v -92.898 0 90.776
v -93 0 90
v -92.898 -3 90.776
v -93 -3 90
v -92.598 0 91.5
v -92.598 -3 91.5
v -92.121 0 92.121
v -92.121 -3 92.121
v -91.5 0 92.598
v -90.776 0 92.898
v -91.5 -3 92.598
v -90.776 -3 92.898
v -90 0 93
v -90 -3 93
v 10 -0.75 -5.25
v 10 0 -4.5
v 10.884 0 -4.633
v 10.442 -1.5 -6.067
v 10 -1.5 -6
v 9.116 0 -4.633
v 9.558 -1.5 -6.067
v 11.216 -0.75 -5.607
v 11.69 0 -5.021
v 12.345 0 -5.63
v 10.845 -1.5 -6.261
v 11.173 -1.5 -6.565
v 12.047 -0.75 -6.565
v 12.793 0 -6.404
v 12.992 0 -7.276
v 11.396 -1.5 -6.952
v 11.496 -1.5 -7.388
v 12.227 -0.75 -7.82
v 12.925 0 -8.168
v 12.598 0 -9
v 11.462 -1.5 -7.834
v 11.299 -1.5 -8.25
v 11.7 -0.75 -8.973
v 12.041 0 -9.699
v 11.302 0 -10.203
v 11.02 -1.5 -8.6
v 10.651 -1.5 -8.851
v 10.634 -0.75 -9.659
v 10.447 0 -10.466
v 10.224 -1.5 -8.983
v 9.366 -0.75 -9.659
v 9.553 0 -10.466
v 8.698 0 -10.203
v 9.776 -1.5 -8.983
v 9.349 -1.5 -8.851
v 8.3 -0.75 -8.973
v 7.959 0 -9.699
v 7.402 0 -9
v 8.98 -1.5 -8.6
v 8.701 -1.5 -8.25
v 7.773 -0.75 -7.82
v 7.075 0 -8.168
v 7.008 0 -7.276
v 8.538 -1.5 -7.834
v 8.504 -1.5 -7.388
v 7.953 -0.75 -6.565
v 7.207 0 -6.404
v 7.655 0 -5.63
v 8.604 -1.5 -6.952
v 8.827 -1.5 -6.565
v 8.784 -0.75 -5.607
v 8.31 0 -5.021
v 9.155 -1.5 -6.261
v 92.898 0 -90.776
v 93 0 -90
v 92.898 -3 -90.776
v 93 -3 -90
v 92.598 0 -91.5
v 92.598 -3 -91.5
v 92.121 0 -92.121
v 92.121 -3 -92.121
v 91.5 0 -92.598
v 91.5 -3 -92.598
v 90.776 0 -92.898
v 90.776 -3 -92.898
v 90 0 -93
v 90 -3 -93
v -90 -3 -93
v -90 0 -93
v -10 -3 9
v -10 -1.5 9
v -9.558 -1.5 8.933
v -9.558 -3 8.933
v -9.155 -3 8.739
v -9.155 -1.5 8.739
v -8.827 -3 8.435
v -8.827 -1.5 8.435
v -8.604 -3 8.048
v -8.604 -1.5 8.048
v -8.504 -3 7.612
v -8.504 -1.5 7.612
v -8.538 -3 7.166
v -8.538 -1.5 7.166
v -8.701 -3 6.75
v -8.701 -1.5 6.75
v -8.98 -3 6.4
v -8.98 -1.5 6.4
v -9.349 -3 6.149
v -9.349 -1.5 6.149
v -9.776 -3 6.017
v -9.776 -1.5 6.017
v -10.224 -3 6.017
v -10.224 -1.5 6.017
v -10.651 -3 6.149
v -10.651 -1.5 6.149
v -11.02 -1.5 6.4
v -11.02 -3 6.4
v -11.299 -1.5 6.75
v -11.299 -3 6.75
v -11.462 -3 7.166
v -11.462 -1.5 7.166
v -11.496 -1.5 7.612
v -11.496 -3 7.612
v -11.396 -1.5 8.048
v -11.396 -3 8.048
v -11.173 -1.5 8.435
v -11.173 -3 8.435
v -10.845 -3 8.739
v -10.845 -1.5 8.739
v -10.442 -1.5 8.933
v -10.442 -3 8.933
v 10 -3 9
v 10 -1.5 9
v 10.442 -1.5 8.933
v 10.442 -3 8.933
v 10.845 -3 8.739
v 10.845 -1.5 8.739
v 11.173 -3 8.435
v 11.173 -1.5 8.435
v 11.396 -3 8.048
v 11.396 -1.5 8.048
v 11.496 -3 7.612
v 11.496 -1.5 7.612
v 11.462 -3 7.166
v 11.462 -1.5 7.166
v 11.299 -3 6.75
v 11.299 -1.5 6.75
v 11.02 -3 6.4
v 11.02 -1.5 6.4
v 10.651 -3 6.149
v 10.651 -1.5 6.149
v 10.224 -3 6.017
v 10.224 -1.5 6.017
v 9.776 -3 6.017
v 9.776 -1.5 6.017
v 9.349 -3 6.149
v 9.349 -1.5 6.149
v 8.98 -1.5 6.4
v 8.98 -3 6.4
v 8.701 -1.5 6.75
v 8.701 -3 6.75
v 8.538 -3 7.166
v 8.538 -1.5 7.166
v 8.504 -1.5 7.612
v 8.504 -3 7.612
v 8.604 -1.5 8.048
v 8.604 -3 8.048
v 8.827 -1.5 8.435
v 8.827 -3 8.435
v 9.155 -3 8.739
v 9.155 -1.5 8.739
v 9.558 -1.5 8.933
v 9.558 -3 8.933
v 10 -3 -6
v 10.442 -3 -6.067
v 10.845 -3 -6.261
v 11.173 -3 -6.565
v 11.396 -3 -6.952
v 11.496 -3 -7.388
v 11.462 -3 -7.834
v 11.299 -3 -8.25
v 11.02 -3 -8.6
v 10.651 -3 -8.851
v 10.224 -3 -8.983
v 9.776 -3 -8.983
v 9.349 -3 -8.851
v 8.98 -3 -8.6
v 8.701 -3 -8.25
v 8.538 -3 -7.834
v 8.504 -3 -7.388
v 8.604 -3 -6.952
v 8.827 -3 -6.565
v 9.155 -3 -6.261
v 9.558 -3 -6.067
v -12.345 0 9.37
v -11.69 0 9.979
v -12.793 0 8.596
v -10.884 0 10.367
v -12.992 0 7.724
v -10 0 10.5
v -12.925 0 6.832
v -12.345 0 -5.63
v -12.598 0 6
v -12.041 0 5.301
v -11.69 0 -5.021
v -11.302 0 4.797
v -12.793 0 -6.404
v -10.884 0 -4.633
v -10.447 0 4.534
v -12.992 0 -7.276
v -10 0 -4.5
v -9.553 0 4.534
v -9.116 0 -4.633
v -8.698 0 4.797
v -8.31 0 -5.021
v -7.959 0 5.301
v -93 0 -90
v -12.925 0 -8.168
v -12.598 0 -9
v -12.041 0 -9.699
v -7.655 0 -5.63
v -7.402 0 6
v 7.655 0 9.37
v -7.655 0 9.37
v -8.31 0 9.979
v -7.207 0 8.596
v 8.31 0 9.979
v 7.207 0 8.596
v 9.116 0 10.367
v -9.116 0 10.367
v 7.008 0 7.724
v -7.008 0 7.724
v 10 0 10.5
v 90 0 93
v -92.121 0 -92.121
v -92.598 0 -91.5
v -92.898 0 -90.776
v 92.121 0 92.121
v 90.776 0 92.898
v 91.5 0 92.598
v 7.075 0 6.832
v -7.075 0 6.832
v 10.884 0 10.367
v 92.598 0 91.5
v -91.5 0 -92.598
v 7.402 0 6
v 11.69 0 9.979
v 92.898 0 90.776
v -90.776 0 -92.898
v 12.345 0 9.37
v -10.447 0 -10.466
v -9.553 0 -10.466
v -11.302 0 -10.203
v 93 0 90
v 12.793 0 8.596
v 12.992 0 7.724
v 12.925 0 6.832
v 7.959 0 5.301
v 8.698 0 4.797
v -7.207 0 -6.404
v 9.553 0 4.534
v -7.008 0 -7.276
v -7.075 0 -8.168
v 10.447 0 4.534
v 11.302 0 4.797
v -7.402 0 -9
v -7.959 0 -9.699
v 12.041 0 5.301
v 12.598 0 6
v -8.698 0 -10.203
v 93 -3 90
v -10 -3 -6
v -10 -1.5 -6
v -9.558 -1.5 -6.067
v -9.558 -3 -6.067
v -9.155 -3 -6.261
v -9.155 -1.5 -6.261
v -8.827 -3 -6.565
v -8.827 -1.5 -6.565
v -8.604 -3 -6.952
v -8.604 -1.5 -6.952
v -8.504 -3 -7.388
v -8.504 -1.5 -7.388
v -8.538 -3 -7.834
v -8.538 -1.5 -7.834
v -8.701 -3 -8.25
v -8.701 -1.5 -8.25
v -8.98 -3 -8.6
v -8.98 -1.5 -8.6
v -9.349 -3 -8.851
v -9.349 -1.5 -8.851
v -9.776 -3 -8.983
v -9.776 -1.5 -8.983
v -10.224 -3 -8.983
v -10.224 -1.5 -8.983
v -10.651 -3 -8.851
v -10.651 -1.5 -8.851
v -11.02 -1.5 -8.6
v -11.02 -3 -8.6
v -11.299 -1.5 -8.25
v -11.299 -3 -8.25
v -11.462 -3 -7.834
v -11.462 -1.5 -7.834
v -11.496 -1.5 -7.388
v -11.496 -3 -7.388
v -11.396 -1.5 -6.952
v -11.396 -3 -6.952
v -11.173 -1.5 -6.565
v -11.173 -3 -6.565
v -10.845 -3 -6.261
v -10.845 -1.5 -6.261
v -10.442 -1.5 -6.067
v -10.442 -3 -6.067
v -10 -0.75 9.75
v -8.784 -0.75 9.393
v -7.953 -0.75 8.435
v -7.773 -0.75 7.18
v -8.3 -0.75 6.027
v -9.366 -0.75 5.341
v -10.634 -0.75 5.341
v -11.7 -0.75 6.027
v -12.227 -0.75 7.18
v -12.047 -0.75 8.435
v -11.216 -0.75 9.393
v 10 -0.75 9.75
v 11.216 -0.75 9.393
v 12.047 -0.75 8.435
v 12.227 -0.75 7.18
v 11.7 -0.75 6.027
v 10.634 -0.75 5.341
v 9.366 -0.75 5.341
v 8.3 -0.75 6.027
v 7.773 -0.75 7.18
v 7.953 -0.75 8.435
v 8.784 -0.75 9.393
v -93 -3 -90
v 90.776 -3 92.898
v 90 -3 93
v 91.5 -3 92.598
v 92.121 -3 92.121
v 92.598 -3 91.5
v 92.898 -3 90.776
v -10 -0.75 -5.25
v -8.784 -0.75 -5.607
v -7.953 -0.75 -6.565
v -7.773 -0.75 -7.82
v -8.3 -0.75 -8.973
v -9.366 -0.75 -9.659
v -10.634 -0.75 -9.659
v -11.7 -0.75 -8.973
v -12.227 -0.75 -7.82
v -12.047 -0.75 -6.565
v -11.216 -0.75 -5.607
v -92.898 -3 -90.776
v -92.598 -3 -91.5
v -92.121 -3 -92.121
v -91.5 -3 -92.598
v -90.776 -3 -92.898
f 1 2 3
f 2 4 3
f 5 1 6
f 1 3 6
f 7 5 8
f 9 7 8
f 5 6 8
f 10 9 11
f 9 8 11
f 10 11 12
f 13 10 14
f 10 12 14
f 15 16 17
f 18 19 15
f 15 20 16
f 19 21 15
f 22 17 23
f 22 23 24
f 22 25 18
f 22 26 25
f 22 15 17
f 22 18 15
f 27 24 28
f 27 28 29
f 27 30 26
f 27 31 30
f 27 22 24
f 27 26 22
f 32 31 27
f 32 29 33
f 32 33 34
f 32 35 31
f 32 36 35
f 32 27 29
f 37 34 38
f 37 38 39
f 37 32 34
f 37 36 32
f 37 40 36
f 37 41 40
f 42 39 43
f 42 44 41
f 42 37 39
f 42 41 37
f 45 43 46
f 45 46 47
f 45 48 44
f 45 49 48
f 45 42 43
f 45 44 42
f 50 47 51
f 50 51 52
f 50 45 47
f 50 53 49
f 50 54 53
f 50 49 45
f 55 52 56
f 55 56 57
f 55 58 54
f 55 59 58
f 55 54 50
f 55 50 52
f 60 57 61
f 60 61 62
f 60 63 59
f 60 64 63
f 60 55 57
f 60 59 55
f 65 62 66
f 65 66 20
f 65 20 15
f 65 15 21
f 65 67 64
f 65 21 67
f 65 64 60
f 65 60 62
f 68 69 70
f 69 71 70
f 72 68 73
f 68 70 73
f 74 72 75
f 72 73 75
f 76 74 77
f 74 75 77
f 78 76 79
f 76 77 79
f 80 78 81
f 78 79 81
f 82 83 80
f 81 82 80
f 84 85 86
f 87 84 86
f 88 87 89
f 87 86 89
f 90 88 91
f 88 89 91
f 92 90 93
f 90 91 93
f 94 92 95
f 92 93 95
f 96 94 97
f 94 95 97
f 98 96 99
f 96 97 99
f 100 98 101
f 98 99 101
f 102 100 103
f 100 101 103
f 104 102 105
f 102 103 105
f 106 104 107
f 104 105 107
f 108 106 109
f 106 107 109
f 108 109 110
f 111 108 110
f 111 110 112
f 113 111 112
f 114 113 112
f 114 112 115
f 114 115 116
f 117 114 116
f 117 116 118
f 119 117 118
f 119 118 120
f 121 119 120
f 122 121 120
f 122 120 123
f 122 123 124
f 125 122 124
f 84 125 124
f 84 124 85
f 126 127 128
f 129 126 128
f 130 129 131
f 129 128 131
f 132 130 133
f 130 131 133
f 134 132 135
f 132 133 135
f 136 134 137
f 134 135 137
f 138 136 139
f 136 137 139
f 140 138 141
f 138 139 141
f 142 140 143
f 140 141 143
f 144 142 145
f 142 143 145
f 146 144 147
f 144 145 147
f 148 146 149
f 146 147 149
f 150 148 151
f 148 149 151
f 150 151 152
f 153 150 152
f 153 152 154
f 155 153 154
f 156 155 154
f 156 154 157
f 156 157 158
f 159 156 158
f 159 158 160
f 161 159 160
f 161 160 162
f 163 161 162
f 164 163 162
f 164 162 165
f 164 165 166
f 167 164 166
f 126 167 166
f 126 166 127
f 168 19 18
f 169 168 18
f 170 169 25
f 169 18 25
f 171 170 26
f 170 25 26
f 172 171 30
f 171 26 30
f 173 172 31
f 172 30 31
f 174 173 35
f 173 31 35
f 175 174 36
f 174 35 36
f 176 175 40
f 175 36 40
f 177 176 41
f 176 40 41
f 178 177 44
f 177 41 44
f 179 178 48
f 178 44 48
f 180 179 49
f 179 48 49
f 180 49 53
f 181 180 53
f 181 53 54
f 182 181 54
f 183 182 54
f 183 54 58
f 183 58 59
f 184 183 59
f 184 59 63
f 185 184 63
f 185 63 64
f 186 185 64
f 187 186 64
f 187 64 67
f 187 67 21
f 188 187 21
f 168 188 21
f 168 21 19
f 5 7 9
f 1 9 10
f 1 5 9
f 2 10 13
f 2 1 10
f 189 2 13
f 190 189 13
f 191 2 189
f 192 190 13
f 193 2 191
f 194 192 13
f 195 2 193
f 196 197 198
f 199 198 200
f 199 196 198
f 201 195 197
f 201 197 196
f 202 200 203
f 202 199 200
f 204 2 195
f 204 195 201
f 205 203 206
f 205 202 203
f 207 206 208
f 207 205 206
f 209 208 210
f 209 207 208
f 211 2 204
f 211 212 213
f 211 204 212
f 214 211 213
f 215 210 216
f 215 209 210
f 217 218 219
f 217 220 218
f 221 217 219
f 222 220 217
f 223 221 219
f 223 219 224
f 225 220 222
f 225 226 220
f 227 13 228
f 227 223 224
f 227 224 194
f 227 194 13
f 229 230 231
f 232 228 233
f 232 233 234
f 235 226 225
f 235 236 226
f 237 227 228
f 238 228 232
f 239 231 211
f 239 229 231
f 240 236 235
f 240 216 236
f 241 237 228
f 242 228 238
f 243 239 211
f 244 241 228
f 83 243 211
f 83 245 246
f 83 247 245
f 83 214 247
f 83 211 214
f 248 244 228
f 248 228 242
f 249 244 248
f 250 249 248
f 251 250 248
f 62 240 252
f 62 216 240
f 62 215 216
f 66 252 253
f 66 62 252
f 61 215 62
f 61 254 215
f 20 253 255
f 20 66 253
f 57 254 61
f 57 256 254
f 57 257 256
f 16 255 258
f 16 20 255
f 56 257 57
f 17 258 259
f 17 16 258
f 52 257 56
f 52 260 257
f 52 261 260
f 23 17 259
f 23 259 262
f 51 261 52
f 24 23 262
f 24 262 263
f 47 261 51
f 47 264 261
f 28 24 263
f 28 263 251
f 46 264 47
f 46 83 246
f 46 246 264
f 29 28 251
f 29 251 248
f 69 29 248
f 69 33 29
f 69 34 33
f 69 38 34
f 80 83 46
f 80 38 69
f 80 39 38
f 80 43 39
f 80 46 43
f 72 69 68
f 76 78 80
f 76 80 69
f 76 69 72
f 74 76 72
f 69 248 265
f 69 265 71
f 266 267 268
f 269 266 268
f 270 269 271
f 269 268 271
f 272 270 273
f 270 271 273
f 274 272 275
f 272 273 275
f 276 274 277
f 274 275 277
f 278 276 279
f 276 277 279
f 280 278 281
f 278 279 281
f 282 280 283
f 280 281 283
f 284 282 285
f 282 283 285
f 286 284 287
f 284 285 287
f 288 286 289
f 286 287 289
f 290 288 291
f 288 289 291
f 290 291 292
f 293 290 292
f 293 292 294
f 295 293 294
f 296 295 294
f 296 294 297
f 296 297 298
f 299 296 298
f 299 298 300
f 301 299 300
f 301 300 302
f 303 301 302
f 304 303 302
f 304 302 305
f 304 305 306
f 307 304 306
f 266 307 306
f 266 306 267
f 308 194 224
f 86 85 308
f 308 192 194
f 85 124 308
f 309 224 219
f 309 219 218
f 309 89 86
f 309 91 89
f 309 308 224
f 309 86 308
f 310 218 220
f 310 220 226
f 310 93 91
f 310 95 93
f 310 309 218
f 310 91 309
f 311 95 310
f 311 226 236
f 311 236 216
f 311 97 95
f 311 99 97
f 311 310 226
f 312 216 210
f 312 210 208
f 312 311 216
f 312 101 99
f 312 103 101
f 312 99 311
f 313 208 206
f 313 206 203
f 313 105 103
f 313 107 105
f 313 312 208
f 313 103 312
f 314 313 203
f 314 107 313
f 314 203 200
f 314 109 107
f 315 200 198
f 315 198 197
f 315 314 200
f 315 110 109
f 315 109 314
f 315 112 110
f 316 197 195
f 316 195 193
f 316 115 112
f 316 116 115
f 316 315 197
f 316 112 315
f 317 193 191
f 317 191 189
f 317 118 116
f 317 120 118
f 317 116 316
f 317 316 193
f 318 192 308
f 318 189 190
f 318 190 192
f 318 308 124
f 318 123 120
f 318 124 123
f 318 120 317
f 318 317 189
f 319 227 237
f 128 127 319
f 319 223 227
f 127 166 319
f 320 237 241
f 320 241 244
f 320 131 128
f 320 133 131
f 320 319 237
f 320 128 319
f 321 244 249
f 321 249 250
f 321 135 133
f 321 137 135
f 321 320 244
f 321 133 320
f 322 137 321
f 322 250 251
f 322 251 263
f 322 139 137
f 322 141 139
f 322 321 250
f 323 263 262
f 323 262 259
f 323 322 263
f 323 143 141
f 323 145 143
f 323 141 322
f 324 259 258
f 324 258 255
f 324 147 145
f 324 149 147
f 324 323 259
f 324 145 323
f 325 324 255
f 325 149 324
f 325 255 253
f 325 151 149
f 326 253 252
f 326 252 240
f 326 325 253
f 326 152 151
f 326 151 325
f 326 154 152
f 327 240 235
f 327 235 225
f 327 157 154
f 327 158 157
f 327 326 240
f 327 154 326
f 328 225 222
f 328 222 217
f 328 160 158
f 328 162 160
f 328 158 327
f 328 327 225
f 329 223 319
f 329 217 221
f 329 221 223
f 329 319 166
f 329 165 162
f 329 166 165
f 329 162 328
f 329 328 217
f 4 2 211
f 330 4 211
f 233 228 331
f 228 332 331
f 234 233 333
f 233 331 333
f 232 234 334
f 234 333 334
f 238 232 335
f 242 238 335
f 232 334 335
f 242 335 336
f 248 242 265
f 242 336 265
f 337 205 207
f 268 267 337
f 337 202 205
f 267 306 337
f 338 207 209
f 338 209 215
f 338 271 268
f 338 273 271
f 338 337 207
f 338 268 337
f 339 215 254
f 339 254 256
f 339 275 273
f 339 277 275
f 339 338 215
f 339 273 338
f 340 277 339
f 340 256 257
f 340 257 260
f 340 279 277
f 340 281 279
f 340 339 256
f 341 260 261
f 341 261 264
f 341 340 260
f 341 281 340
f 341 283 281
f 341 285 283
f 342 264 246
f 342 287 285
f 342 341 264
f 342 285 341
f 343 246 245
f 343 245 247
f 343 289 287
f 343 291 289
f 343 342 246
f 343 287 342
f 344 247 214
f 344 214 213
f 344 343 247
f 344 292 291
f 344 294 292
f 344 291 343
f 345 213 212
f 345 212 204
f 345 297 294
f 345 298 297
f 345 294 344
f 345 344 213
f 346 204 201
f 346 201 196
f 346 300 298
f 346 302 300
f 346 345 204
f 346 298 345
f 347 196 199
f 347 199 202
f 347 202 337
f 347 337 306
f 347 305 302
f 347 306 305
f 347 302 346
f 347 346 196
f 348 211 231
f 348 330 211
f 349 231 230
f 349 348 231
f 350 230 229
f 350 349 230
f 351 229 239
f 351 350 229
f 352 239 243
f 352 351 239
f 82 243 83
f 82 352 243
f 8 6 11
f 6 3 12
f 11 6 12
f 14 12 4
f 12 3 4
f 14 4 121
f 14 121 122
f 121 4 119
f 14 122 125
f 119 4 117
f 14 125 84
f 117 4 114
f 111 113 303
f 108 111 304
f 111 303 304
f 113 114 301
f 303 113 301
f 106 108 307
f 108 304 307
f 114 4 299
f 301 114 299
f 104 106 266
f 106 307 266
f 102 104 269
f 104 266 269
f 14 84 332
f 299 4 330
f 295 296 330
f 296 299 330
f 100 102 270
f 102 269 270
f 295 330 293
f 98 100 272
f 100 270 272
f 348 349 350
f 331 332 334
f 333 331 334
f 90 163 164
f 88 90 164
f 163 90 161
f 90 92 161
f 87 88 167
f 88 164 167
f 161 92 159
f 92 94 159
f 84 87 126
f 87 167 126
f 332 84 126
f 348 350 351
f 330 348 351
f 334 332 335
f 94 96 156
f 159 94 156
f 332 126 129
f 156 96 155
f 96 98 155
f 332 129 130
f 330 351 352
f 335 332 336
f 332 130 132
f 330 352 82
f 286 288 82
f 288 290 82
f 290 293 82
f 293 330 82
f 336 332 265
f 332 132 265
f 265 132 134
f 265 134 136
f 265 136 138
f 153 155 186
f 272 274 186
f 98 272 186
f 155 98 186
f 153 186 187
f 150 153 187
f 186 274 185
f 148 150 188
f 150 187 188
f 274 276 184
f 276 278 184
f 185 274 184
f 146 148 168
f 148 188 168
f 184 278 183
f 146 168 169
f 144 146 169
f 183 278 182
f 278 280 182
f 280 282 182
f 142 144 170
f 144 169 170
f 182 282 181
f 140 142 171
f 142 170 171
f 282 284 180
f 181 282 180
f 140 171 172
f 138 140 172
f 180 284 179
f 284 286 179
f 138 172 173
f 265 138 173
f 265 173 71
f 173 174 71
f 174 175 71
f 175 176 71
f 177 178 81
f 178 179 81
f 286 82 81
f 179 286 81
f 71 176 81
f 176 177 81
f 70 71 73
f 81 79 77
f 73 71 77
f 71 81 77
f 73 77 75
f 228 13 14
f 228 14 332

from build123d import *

# Parameters (mm, degrees)
SKETCH1_W           = 186
SKETCH1_H           = 186
BOSS_EXTRUDE1_DEPTH = 3
FILLET1_R           = 3
SKETCH2_R           = 1.5
CUT_EXTRUDE1_DEPTH  = 10
CHAMFER1_SIZE       = 1.5


with BuildPart() as part:
    # Sketch1 → Boss-Extrude1 (new body)
    with BuildSketch(Plane(origin=(0, 0, 0), x_dir=(1, 0, 0), z_dir=(0, 1, 0))):
        Rectangle(SKETCH1_W, SKETCH1_H)
    extrude(amount=-BOSS_EXTRUDE1_DEPTH)

    # Fillet1
    fillet1_edges = [part.edges().sort_by_distance(p)[0] for p in [
        (93, -1.5, 93),
        (-93, -1.5, 93),
        (-93, -1.5, -93),
        (93, -1.5, -93),
    ]]
    fillet(fillet1_edges, radius=FILLET1_R)

    # Sketch2 → Cut-Extrude1 (cut)
    with BuildSketch(Plane(origin=(0, 0, 0), x_dir=(1, 0, 0), z_dir=(0, 1, 0))):
        with Locations(Location((-10, -7.5, 0), (0, 0, 270))):
            Circle(SKETCH2_R)
        with Locations(Location((-10, 7.5, 0), (0, 0, 270))):
            Circle(SKETCH2_R)
        with Locations(Location((10, 7.5, 0), (0, 0, 270))):
            Circle(SKETCH2_R)
        with Locations(Location((10, -7.5, 0), (0, 0, 270))):
            Circle(SKETCH2_R)
    extrude(amount=-CUT_EXTRUDE1_DEPTH, mode=Mode.SUBTRACT)

    # Chamfer1
    chamfer1_edges = [part.edges().sort_by_distance(p)[0] for p in [
        (-10, 0, 6),
        (-10, 0, -9),
        (10, 0, -9),
        (10, 0, 6),
    ]]
    chamfer(chamfer1_edges, length=CHAMFER1_SIZE)


solid = part.part
